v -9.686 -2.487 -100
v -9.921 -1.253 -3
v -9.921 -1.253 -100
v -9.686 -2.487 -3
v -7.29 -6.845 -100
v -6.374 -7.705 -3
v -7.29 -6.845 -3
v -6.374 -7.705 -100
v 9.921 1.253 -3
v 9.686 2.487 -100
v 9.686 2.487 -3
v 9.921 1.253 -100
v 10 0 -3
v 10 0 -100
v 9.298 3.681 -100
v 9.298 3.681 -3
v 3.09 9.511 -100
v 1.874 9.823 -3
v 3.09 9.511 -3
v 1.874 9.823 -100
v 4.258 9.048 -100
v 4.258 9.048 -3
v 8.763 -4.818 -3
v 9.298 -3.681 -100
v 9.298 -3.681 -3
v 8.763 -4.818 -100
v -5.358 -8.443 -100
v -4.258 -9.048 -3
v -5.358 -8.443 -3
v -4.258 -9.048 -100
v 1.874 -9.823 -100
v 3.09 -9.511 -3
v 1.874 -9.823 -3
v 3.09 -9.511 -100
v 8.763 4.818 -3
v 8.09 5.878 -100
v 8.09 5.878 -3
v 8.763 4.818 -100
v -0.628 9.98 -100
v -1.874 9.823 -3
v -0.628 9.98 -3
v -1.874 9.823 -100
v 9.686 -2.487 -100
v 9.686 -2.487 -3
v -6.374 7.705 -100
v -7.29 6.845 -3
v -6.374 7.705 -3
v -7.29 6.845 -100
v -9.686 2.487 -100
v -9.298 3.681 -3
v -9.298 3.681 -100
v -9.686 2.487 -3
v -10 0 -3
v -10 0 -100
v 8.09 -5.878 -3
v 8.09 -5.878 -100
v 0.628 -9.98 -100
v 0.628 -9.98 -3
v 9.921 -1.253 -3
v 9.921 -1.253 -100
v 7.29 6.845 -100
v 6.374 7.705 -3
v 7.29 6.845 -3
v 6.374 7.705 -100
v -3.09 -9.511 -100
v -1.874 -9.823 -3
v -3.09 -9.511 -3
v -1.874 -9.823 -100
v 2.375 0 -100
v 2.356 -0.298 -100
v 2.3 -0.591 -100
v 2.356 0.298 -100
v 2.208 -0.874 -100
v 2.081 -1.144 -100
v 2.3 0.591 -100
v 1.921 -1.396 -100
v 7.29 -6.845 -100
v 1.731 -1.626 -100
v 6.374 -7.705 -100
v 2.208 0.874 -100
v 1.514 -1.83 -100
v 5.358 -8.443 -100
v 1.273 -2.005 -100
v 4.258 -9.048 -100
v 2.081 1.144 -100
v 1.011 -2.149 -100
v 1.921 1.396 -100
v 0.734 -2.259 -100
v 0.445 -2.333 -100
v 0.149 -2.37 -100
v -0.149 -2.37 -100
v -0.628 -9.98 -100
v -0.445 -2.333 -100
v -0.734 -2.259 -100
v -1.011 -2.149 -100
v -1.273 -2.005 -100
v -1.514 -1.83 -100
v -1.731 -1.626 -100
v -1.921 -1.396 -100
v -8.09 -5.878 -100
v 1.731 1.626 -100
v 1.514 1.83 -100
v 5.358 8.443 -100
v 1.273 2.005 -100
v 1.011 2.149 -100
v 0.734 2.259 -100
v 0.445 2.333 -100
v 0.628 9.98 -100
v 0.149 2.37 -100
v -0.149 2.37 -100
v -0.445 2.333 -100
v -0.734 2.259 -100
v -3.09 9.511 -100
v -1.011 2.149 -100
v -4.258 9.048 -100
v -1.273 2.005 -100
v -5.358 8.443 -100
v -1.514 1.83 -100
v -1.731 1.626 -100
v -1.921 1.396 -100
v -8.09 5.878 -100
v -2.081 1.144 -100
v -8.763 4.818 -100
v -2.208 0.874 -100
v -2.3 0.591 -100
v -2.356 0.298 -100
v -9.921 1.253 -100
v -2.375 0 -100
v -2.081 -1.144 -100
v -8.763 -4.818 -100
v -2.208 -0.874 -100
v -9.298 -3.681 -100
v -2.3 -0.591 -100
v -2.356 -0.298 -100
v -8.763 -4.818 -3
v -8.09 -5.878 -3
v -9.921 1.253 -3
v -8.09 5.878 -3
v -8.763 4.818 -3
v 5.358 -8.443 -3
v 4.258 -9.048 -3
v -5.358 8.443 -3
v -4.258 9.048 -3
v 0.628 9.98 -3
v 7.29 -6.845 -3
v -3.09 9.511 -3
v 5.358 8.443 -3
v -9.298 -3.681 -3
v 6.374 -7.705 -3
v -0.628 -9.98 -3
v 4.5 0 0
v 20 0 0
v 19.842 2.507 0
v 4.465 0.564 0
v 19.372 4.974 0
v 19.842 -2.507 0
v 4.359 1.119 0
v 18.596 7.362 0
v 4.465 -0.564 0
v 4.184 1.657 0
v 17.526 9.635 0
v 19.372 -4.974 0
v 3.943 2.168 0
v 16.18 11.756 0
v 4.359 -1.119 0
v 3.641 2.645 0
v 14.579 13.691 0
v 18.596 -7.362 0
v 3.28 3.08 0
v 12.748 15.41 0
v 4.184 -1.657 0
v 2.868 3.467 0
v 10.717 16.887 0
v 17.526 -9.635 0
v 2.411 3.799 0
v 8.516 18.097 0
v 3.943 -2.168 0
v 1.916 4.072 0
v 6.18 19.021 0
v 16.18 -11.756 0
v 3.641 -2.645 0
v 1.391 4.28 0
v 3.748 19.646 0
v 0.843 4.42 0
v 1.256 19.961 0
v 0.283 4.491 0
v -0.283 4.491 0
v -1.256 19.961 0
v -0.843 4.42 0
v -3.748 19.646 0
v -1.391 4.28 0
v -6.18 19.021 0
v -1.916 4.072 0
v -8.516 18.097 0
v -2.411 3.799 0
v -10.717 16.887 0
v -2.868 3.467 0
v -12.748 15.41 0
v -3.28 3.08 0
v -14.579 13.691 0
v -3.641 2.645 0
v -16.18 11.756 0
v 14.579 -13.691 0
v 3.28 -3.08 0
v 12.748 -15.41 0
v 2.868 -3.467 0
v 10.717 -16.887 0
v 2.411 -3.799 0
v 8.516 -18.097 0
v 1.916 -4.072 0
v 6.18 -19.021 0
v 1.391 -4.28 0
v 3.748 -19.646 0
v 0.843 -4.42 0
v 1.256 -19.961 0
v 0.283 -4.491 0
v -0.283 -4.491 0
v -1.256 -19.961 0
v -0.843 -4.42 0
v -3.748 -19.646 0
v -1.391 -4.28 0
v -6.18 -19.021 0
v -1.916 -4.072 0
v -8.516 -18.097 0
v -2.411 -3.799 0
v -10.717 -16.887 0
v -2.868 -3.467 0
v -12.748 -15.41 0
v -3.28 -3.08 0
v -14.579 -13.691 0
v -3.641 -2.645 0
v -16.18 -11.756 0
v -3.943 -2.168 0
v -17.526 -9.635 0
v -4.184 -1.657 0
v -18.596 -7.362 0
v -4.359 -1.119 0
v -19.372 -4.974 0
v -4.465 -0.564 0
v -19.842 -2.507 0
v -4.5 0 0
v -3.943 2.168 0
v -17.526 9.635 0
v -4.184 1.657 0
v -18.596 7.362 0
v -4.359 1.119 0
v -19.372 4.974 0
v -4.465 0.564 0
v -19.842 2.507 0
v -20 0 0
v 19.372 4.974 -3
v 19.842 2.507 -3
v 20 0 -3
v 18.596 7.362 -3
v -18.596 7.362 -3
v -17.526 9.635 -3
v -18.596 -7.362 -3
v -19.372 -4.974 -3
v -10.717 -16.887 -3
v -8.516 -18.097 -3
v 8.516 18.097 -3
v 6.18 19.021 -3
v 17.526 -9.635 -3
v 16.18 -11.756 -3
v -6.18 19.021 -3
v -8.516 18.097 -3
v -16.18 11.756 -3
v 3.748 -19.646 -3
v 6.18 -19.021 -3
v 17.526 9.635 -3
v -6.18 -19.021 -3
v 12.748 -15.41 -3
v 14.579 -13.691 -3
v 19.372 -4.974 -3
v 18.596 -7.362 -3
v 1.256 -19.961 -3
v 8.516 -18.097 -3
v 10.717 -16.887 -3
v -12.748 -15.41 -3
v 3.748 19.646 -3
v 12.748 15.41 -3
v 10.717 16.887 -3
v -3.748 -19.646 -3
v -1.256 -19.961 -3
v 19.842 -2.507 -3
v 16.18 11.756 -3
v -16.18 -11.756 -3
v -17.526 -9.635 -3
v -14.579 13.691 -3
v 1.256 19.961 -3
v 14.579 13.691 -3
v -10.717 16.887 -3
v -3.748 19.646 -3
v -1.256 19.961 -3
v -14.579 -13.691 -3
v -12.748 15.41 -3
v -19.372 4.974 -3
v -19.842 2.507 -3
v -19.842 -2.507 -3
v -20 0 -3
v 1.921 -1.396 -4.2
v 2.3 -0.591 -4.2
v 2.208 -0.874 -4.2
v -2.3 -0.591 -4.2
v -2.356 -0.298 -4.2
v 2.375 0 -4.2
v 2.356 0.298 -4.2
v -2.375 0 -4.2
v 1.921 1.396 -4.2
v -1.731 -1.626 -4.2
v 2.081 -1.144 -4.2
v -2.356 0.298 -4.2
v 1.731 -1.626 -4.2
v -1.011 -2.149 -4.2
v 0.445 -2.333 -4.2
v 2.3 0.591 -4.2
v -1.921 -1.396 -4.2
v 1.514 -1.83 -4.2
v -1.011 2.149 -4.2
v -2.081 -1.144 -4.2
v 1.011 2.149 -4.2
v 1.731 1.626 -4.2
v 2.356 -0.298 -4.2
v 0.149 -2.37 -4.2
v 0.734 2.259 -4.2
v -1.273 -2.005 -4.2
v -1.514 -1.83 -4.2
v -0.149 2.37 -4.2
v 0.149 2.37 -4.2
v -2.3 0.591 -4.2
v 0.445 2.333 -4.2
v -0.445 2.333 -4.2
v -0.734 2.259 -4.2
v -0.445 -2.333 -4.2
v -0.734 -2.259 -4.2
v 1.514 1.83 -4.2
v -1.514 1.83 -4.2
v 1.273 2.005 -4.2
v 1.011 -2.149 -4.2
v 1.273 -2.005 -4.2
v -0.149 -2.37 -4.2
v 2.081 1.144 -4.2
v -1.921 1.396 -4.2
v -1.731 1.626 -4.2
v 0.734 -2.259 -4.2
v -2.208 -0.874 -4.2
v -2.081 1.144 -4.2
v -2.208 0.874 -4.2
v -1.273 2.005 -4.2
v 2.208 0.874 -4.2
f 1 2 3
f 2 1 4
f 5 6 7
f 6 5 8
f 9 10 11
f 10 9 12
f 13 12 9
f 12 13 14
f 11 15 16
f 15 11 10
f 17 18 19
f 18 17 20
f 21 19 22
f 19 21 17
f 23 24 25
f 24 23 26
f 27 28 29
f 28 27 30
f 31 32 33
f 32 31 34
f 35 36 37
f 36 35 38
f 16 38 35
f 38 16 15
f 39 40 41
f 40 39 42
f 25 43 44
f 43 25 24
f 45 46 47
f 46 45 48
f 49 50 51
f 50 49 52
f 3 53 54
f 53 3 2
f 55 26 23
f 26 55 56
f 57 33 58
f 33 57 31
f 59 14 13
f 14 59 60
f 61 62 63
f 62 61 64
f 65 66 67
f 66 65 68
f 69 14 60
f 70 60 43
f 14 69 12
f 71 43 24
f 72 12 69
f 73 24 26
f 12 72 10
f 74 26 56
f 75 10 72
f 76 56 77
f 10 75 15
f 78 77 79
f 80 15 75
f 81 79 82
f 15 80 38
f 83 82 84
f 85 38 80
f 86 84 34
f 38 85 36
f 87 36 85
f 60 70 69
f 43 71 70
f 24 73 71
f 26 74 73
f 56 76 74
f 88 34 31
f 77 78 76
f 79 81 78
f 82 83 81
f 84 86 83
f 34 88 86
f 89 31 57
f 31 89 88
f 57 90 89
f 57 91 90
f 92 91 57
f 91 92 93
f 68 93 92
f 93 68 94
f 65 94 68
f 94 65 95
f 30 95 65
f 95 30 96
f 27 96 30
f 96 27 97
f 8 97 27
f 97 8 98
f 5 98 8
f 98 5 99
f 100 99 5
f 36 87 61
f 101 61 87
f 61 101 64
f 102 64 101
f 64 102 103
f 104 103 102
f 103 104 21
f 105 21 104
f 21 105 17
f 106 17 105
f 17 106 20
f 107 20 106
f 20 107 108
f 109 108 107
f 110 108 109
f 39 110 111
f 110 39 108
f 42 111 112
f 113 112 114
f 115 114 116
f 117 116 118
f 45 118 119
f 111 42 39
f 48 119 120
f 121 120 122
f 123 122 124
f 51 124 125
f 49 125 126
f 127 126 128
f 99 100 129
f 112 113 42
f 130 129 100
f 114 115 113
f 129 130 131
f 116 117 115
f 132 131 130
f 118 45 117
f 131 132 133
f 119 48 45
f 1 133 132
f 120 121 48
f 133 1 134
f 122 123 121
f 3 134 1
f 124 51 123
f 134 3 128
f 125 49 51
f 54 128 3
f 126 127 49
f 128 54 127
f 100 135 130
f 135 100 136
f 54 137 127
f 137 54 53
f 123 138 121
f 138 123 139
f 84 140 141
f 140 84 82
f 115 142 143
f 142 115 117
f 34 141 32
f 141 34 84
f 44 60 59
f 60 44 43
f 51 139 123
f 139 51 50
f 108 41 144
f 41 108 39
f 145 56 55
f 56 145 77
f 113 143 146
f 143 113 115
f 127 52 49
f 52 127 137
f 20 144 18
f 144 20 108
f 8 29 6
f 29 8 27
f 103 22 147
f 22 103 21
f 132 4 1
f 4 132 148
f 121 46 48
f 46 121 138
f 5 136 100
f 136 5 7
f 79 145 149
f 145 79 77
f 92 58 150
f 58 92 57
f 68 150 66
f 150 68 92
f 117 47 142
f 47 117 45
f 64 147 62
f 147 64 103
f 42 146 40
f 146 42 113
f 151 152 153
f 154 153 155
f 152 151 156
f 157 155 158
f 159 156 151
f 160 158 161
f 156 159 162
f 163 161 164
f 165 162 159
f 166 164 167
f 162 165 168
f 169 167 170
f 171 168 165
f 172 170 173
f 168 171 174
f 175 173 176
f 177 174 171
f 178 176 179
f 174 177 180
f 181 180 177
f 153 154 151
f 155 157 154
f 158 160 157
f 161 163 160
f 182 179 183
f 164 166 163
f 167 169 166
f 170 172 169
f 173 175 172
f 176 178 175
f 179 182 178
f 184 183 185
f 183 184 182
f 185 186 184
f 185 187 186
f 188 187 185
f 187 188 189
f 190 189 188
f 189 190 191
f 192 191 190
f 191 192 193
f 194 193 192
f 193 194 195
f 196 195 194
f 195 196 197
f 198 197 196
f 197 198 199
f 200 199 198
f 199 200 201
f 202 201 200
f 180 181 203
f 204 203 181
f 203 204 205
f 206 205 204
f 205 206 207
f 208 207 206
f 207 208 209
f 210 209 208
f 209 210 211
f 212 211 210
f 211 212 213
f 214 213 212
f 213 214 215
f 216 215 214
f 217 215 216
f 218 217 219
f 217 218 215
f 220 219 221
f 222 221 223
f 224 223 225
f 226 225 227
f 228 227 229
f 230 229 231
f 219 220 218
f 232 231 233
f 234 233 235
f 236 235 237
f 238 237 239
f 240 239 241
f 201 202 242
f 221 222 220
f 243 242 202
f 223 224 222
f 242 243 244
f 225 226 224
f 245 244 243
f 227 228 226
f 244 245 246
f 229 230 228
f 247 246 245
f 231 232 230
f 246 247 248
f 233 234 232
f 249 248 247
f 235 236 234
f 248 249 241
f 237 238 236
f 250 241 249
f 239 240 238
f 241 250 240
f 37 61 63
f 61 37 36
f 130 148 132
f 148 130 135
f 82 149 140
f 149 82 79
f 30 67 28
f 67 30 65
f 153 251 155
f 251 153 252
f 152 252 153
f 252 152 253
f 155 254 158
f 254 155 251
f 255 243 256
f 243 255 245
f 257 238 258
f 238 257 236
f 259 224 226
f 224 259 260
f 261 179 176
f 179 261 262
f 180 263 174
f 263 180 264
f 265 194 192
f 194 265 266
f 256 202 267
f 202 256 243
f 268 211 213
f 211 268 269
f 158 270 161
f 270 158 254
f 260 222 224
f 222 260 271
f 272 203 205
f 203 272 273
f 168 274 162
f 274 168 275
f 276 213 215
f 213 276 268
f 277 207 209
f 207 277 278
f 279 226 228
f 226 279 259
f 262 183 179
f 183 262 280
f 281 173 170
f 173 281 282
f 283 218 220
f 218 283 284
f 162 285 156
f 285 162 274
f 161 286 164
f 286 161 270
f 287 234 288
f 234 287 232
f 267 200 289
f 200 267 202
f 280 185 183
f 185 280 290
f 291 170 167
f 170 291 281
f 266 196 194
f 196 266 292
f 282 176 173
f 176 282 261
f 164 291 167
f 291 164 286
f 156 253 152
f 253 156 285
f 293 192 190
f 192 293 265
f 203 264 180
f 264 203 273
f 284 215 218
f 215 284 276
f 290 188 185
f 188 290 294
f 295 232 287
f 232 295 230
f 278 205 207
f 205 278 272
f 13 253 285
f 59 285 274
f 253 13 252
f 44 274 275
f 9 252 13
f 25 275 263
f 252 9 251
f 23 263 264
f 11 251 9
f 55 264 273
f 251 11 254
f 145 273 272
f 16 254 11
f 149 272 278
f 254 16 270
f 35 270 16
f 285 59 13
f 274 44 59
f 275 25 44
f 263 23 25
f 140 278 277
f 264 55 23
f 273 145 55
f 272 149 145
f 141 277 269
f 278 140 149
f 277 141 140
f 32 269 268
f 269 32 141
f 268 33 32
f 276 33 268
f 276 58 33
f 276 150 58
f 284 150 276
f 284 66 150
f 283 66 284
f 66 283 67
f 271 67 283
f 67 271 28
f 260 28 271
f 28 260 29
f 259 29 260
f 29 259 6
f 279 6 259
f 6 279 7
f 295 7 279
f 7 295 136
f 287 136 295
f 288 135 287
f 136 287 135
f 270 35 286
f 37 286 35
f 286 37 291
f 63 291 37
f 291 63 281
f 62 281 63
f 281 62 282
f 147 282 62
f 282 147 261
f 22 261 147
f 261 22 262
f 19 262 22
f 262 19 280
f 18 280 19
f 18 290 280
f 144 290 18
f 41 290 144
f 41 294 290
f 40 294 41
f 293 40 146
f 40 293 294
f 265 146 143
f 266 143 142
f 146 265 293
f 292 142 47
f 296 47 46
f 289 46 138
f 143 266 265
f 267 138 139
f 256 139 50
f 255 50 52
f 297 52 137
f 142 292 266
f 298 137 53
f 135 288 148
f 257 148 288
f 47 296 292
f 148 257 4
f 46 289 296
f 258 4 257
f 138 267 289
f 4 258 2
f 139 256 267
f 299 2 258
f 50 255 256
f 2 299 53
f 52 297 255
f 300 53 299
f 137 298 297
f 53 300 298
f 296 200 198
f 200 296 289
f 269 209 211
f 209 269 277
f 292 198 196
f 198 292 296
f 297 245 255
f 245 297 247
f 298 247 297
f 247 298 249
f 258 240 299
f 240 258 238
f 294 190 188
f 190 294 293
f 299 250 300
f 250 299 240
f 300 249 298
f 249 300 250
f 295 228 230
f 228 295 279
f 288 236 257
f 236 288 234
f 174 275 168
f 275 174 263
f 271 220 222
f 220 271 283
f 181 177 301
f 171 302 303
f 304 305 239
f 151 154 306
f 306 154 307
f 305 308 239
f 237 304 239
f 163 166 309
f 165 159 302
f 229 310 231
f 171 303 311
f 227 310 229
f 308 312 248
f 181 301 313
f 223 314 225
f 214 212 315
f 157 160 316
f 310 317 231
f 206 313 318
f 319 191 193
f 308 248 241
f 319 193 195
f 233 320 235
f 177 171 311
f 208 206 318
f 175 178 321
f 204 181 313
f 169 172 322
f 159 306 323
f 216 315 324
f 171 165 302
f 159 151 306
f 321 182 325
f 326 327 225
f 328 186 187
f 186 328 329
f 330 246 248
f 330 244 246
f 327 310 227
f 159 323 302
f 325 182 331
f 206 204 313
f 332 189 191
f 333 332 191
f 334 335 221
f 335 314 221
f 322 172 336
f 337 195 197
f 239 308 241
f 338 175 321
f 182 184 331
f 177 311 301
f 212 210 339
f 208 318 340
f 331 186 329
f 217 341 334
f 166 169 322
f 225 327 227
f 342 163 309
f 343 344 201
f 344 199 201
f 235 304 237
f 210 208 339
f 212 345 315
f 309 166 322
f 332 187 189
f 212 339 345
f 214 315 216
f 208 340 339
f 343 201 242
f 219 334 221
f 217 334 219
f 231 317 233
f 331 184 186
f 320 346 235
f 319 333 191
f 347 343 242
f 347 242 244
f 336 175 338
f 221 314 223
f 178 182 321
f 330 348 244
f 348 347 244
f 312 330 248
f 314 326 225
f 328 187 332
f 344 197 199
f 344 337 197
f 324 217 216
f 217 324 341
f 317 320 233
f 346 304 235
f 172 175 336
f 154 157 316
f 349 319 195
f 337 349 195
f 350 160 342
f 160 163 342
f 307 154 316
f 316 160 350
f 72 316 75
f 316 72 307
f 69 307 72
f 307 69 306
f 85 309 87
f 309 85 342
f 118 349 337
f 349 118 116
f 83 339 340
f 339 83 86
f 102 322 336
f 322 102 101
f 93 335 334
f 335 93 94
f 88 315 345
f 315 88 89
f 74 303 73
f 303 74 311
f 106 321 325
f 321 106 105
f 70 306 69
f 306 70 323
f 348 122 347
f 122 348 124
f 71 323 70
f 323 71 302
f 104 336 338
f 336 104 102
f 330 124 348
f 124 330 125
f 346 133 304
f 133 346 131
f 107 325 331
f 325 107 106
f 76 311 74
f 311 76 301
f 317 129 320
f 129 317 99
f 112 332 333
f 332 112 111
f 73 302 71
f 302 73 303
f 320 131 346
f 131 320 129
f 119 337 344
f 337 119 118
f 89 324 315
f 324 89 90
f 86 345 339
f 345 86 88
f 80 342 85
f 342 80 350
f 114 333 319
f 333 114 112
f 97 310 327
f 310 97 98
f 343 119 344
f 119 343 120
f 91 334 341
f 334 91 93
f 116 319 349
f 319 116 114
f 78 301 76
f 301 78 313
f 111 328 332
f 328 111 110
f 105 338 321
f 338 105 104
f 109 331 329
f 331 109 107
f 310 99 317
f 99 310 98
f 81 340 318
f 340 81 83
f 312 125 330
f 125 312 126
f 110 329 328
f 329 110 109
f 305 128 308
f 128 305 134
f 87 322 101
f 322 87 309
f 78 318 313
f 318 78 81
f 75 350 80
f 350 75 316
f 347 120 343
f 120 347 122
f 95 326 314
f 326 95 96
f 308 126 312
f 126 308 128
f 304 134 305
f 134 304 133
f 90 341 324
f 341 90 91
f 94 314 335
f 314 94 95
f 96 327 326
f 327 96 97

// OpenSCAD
$fn = 50;


difference() {
	union() {
		translate(v = [0, 0, -100.0000000000]) {
			cylinder(h = 100, r = 10.0000000000);
		}
		translate(v = [0, 0, -3.0000000000]) {
			cylinder(h = 3, r = 20.0000000000);
		}
	}
	union() {
		translate(v = [0, 0, 0]) {
			rotate(a = [0, 0, 0]) {
				difference() {
					union() {
						#translate(v = [0, 0, -100.0000000000]) {
							cylinder(h = 100, r = 2.2500000000);
						}
						#translate(v = [0, 0, -4.2000000000]) {
							cylinder(h = 4.2000000000, r = 10.0000000000, r1 = 2.3750000000, r2 = 4.5000000000);
						}
						#translate(v = [0, 0, -100.0000000000]) {
							cylinder(h = 100, r = 2.3750000000);
						}
						#translate(v = [0, 0, -100.0000000000]) {
							cylinder(h = 100, r = 2.2500000000);
						}
					}
					union();
				}
			}
		}
	}
}
